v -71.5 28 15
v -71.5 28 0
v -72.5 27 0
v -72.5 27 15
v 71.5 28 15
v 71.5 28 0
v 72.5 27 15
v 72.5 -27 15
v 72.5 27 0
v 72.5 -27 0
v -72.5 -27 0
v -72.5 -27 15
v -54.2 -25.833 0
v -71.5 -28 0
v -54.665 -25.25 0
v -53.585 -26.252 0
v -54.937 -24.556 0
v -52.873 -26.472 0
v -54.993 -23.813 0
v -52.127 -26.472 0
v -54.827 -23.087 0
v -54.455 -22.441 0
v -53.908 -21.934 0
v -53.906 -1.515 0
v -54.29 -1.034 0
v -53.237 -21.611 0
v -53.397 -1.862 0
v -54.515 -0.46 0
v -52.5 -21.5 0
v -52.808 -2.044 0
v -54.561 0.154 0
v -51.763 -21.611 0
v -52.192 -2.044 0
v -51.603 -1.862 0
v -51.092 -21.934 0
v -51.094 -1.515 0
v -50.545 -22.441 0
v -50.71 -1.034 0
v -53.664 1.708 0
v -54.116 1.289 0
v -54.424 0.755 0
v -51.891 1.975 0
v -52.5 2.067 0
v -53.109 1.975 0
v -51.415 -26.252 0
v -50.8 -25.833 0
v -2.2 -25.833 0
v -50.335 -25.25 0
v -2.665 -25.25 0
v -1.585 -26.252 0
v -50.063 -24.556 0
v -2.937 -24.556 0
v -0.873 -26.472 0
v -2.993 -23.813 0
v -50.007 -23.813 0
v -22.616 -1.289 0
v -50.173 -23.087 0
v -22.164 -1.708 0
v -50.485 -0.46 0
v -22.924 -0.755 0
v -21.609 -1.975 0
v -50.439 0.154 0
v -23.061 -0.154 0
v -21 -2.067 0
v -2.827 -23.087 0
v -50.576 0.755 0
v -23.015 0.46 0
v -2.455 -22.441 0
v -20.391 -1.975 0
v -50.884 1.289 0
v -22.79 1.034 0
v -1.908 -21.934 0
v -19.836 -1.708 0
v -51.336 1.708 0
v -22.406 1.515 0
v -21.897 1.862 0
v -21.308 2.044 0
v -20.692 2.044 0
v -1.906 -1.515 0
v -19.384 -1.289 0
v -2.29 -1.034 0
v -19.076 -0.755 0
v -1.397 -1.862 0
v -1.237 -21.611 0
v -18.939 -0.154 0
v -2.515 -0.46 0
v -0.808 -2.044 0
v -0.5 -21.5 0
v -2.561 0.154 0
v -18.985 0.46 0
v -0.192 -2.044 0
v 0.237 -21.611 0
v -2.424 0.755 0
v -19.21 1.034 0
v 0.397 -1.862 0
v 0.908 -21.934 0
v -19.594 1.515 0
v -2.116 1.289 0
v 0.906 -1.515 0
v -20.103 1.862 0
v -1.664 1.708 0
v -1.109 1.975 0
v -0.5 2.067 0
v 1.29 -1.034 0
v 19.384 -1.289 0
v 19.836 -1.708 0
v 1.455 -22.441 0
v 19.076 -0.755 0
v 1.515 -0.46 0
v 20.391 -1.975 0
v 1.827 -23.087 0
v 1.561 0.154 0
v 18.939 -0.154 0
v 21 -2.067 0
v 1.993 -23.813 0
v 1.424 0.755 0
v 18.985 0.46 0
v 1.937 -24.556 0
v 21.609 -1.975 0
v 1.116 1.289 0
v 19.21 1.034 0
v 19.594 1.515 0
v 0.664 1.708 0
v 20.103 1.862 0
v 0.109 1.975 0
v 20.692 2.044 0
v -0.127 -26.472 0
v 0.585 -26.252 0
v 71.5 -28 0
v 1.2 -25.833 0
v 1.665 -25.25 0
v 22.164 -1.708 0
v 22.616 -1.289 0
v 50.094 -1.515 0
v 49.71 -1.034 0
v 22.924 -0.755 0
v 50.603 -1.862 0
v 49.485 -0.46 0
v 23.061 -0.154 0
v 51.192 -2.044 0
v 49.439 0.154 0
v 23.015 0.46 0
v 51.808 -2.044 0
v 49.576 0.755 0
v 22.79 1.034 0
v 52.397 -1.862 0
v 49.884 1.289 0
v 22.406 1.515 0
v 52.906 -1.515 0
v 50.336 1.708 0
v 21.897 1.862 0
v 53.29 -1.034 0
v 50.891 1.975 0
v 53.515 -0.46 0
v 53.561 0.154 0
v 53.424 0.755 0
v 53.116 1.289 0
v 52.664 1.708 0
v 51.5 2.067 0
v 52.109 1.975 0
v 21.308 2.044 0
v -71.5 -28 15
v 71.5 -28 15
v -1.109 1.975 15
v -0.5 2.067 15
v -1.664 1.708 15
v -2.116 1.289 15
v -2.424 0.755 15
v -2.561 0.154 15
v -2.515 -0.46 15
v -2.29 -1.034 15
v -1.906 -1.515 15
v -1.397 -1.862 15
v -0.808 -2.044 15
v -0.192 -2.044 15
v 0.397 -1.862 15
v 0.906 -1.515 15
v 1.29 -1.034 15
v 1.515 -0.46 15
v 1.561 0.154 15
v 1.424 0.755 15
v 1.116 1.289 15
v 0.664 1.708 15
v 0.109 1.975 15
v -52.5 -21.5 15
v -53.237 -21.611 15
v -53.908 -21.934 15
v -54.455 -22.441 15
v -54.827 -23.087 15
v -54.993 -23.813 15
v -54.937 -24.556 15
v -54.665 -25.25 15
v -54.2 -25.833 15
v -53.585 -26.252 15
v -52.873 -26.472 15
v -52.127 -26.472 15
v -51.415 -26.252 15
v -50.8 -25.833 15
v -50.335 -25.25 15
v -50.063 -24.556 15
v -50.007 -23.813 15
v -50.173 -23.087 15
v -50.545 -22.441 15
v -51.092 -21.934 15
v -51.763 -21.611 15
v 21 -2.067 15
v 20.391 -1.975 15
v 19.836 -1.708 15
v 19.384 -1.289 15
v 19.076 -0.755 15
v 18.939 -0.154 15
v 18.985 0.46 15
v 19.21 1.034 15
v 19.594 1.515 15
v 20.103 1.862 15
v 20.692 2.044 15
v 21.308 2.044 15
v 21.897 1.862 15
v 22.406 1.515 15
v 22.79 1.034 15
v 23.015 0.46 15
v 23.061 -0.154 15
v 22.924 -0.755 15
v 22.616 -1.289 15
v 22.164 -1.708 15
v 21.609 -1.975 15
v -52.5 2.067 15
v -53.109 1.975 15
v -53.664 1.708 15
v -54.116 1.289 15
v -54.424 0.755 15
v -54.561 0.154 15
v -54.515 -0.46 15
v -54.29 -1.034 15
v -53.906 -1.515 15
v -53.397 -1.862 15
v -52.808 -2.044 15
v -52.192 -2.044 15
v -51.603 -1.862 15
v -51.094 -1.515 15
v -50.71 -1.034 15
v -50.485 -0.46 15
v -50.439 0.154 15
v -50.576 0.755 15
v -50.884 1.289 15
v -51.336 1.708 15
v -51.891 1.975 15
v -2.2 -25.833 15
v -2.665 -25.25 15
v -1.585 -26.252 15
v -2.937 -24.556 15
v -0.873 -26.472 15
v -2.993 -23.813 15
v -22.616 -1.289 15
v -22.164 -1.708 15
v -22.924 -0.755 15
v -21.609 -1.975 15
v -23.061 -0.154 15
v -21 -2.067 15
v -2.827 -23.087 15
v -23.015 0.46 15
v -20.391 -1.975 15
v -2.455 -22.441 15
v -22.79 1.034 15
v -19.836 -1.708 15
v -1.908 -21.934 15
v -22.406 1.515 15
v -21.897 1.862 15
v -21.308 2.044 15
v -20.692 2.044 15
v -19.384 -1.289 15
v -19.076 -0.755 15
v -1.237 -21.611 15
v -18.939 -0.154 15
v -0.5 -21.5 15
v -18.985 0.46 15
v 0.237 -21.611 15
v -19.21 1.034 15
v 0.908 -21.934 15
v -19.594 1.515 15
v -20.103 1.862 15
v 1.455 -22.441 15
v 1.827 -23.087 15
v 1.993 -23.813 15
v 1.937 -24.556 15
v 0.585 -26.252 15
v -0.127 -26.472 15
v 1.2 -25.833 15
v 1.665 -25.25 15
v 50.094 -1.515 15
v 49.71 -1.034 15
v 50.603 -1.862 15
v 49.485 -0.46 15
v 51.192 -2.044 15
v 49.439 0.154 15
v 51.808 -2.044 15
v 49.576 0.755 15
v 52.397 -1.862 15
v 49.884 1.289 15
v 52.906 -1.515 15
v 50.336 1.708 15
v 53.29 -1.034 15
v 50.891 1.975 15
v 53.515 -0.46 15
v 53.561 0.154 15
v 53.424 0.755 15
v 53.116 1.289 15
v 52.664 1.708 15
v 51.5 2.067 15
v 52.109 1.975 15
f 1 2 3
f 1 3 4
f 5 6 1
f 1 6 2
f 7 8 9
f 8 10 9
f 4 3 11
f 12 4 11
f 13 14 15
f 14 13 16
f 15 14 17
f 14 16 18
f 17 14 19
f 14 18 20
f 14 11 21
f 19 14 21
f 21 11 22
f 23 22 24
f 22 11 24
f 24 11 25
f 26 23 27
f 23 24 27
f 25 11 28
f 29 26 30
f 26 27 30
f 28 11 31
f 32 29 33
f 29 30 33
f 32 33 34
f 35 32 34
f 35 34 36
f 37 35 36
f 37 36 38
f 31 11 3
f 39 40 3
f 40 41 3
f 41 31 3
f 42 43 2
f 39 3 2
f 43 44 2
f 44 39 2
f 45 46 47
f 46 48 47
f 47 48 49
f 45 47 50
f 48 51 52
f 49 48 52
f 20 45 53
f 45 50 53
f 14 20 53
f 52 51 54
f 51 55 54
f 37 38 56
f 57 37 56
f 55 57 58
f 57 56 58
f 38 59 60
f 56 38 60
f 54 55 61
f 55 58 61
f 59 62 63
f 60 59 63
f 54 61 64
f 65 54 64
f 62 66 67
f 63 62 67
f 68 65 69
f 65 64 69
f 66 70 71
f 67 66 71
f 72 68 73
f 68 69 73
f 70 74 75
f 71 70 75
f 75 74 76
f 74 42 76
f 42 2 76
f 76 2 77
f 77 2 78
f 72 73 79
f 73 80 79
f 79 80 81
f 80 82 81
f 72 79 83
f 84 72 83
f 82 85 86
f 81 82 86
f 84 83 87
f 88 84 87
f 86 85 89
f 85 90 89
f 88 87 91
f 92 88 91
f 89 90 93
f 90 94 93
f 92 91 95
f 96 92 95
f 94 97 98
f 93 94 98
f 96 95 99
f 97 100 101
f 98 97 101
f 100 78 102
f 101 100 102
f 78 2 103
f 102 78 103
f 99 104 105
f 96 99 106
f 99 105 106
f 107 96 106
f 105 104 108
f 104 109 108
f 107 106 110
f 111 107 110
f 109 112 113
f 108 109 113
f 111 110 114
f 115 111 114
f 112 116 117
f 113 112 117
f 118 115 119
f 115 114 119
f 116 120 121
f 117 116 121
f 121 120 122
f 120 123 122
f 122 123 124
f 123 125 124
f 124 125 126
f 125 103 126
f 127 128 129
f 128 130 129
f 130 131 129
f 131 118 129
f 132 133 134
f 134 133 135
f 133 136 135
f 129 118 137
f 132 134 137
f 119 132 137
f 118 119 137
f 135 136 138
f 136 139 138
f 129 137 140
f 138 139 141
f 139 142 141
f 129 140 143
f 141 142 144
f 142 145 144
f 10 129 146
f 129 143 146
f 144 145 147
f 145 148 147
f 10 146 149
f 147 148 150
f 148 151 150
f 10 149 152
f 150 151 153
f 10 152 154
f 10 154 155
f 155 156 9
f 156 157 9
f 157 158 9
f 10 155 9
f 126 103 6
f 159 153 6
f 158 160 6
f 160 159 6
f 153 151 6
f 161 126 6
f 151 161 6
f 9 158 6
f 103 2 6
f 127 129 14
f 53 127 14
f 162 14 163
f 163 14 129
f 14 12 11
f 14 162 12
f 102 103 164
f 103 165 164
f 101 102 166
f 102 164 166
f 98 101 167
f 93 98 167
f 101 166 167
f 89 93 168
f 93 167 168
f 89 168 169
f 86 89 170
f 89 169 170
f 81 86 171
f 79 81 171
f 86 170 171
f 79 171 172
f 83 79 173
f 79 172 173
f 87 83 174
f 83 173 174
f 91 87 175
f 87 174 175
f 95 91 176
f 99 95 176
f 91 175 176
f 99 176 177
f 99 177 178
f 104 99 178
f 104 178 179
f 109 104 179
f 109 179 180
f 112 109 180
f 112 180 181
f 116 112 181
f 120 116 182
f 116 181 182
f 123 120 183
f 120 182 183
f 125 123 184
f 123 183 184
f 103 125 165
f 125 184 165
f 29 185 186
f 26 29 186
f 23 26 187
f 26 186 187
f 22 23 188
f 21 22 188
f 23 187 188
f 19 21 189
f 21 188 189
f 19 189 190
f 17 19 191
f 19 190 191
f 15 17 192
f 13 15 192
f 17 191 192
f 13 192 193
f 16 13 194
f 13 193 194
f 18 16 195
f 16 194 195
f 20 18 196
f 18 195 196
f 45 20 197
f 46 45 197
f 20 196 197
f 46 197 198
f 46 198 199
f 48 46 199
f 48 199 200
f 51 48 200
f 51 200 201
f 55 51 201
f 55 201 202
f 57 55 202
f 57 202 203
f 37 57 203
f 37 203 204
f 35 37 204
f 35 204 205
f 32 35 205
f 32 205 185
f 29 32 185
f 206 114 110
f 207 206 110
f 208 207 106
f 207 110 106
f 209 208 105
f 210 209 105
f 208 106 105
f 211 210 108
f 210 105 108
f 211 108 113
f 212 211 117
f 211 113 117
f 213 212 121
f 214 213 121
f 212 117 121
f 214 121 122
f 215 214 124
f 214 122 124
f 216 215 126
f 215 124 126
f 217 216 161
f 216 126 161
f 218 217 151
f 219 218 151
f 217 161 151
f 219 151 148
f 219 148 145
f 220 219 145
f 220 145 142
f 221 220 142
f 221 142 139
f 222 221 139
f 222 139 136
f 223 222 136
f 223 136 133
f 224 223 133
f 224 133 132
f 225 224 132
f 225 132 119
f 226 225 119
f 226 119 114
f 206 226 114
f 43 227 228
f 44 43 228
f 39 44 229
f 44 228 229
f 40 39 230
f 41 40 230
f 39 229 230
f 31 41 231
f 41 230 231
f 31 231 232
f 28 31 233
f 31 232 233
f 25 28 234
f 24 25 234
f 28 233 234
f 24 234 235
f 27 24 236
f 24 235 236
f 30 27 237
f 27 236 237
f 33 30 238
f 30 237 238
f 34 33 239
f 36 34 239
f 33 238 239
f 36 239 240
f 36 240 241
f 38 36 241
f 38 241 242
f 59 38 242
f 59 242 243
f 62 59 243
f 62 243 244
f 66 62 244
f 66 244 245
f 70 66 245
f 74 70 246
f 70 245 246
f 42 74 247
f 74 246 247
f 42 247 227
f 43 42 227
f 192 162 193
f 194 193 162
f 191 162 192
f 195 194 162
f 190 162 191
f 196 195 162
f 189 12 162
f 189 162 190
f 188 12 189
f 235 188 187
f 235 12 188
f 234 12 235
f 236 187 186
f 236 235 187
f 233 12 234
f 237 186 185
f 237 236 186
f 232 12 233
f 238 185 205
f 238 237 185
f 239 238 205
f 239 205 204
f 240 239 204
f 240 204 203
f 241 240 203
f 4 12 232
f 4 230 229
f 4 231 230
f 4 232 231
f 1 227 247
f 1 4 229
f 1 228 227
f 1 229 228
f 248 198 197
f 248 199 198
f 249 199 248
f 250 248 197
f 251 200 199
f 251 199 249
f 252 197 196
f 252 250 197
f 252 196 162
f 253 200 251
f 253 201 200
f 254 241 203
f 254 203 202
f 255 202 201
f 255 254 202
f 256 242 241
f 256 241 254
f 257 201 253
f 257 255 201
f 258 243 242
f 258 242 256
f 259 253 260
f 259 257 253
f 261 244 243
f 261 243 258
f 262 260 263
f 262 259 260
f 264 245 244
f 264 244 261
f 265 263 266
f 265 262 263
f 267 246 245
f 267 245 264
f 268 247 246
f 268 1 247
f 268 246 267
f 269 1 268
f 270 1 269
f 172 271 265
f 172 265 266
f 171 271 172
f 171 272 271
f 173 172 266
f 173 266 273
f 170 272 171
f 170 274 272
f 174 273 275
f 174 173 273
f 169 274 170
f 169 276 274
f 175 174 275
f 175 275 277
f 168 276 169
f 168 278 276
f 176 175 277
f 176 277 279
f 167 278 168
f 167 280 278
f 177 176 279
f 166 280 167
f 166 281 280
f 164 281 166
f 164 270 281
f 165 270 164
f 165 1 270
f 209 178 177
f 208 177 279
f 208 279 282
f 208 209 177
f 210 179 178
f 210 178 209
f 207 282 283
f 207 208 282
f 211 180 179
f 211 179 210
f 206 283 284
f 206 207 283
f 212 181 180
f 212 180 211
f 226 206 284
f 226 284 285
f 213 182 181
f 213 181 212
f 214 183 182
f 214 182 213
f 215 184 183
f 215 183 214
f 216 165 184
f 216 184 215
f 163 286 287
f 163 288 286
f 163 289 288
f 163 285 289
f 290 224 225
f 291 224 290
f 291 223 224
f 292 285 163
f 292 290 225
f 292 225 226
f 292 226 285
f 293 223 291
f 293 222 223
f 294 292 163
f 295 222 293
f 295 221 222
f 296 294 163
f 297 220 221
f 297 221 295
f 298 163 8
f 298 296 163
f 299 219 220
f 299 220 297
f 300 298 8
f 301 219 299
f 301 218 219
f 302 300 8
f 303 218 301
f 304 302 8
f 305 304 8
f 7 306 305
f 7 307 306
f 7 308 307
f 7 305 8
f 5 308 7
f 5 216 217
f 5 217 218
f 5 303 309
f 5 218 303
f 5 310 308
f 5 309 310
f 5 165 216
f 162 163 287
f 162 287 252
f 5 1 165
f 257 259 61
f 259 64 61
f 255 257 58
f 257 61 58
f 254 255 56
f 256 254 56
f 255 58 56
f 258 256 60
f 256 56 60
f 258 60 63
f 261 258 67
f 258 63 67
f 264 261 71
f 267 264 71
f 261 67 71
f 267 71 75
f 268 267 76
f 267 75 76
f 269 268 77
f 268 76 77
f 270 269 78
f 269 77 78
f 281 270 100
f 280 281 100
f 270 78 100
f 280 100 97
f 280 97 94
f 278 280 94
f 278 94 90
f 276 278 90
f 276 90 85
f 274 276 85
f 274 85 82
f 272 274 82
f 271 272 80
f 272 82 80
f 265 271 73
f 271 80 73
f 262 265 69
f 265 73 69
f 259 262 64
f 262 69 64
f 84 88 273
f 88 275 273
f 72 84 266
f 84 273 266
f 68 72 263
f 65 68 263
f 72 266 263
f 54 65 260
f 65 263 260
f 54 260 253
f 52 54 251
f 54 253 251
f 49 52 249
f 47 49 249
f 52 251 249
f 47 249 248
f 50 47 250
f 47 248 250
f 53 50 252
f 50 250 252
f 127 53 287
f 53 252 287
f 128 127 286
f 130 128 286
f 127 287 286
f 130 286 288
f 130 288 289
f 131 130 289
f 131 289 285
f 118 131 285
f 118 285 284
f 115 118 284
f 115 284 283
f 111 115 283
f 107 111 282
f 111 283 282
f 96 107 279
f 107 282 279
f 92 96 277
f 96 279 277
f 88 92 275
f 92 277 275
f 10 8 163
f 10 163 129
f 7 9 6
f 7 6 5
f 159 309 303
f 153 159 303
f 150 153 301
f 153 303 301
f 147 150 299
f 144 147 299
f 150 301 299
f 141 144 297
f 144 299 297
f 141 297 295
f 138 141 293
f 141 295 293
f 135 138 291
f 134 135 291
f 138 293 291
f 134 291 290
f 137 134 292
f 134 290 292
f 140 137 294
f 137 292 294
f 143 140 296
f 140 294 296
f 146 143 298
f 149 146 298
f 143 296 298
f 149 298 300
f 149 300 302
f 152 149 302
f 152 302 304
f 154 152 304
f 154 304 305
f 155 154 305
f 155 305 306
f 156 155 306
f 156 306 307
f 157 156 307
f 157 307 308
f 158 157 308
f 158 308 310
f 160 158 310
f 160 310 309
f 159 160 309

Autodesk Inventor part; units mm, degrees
ref_plane "YZ Plane" through (0, 0, 0) normal (1, 0, 0) x (0, 1, 0)
ref_plane "XZ Plane" through (0, 0, 0) normal (0, 1, 0) x (-1, 0, 0)
ref_plane "XY Plane" through (0, 0, 0) normal (0, 0, 1) x (1, 0, 0)
sketch "スケッチ1" plane through (0, 0, 0) normal (0, 0, 1) x (1, 0, 0)
  line L0 (-72.5, -28) -> (72.5, -28)
  line L1 (72.5, -28) -> (72.5, 28)
  line L2 (72.5, 28) -> (-72.5, 28)
  line L3 (-72.5, 28) -> (-72.5, -28)
  point P0 (0, 0)
  point P1 (0, -28)
  point P2 (-72.5, 0)
  dimension "d0" = 145
  dimension "d1" = 56
extrude "押し出し1" add sketch "スケッチ1" along normal blind 15
sketch "スケッチ3" plane through (0, 0, 15) normal (0, 0, 1) x (1, 0, 0)
  point P0 (0, 0)
  point P1 (-21, 0)
  point P2 (21, 0)
  dimension "d9" = 21
  dimension "d10" = 21
hole "穴1" at (-21, 0, 15) at (21, 0, 15) direction (0, 0, -1) diameter 4.134 end through all thread size "M5x0.8" class "6H" standard "ANSI Metric M Profile"
sketch "スケッチ4" plane through (0, 0, 0) normal (0, 0, -1) x (-1, 0, 0)
  line L0 (-72.5, -28) -> (-72.5, 28) projected
  point P0 (0, 0)
  point P1 (-51.5, 0)
  point P2 (-72.5, 0)
  dimension "d18" = 21
hole "穴2" at (51.5, 0, 0) direction (0, 0, 1) diameter 4.134 end through all thread size "M5x0.8" class "6H" standard "ANSI Metric M Profile"
pattern_linear "矩形状パターン1" count 3 spacing 52 along (-1, 0, 0) of "穴2"
sketch "スケッチ5" plane through (0, 0, 0) normal (0, 0, -1) x (-1, 0, 0)
  circle A0 centre (52.5, 0) radius 2.067 projected
  circle A1 centre (0.5, 0) radius 2.067 projected
  point P0 (0, 0)
  point P1 (52.5, -24)
  point P2 (0.5, -24)
  dimension "d29" = 24
hole "穴3" at (-52.5, -24, 0) at (-0.5, -24, 0) direction (0, 0, 1) diameter 5 end through all
chamfer "面取り1" distance 1 angle 45 4 edges at (-72.5, -28, 7.5) (-72.5, 28, 7.5) (72.5, -28, 7.5) (72.5, 28, 7.5)
equation "\"d10\" = d9"
properties part number "02" material "A5052"
